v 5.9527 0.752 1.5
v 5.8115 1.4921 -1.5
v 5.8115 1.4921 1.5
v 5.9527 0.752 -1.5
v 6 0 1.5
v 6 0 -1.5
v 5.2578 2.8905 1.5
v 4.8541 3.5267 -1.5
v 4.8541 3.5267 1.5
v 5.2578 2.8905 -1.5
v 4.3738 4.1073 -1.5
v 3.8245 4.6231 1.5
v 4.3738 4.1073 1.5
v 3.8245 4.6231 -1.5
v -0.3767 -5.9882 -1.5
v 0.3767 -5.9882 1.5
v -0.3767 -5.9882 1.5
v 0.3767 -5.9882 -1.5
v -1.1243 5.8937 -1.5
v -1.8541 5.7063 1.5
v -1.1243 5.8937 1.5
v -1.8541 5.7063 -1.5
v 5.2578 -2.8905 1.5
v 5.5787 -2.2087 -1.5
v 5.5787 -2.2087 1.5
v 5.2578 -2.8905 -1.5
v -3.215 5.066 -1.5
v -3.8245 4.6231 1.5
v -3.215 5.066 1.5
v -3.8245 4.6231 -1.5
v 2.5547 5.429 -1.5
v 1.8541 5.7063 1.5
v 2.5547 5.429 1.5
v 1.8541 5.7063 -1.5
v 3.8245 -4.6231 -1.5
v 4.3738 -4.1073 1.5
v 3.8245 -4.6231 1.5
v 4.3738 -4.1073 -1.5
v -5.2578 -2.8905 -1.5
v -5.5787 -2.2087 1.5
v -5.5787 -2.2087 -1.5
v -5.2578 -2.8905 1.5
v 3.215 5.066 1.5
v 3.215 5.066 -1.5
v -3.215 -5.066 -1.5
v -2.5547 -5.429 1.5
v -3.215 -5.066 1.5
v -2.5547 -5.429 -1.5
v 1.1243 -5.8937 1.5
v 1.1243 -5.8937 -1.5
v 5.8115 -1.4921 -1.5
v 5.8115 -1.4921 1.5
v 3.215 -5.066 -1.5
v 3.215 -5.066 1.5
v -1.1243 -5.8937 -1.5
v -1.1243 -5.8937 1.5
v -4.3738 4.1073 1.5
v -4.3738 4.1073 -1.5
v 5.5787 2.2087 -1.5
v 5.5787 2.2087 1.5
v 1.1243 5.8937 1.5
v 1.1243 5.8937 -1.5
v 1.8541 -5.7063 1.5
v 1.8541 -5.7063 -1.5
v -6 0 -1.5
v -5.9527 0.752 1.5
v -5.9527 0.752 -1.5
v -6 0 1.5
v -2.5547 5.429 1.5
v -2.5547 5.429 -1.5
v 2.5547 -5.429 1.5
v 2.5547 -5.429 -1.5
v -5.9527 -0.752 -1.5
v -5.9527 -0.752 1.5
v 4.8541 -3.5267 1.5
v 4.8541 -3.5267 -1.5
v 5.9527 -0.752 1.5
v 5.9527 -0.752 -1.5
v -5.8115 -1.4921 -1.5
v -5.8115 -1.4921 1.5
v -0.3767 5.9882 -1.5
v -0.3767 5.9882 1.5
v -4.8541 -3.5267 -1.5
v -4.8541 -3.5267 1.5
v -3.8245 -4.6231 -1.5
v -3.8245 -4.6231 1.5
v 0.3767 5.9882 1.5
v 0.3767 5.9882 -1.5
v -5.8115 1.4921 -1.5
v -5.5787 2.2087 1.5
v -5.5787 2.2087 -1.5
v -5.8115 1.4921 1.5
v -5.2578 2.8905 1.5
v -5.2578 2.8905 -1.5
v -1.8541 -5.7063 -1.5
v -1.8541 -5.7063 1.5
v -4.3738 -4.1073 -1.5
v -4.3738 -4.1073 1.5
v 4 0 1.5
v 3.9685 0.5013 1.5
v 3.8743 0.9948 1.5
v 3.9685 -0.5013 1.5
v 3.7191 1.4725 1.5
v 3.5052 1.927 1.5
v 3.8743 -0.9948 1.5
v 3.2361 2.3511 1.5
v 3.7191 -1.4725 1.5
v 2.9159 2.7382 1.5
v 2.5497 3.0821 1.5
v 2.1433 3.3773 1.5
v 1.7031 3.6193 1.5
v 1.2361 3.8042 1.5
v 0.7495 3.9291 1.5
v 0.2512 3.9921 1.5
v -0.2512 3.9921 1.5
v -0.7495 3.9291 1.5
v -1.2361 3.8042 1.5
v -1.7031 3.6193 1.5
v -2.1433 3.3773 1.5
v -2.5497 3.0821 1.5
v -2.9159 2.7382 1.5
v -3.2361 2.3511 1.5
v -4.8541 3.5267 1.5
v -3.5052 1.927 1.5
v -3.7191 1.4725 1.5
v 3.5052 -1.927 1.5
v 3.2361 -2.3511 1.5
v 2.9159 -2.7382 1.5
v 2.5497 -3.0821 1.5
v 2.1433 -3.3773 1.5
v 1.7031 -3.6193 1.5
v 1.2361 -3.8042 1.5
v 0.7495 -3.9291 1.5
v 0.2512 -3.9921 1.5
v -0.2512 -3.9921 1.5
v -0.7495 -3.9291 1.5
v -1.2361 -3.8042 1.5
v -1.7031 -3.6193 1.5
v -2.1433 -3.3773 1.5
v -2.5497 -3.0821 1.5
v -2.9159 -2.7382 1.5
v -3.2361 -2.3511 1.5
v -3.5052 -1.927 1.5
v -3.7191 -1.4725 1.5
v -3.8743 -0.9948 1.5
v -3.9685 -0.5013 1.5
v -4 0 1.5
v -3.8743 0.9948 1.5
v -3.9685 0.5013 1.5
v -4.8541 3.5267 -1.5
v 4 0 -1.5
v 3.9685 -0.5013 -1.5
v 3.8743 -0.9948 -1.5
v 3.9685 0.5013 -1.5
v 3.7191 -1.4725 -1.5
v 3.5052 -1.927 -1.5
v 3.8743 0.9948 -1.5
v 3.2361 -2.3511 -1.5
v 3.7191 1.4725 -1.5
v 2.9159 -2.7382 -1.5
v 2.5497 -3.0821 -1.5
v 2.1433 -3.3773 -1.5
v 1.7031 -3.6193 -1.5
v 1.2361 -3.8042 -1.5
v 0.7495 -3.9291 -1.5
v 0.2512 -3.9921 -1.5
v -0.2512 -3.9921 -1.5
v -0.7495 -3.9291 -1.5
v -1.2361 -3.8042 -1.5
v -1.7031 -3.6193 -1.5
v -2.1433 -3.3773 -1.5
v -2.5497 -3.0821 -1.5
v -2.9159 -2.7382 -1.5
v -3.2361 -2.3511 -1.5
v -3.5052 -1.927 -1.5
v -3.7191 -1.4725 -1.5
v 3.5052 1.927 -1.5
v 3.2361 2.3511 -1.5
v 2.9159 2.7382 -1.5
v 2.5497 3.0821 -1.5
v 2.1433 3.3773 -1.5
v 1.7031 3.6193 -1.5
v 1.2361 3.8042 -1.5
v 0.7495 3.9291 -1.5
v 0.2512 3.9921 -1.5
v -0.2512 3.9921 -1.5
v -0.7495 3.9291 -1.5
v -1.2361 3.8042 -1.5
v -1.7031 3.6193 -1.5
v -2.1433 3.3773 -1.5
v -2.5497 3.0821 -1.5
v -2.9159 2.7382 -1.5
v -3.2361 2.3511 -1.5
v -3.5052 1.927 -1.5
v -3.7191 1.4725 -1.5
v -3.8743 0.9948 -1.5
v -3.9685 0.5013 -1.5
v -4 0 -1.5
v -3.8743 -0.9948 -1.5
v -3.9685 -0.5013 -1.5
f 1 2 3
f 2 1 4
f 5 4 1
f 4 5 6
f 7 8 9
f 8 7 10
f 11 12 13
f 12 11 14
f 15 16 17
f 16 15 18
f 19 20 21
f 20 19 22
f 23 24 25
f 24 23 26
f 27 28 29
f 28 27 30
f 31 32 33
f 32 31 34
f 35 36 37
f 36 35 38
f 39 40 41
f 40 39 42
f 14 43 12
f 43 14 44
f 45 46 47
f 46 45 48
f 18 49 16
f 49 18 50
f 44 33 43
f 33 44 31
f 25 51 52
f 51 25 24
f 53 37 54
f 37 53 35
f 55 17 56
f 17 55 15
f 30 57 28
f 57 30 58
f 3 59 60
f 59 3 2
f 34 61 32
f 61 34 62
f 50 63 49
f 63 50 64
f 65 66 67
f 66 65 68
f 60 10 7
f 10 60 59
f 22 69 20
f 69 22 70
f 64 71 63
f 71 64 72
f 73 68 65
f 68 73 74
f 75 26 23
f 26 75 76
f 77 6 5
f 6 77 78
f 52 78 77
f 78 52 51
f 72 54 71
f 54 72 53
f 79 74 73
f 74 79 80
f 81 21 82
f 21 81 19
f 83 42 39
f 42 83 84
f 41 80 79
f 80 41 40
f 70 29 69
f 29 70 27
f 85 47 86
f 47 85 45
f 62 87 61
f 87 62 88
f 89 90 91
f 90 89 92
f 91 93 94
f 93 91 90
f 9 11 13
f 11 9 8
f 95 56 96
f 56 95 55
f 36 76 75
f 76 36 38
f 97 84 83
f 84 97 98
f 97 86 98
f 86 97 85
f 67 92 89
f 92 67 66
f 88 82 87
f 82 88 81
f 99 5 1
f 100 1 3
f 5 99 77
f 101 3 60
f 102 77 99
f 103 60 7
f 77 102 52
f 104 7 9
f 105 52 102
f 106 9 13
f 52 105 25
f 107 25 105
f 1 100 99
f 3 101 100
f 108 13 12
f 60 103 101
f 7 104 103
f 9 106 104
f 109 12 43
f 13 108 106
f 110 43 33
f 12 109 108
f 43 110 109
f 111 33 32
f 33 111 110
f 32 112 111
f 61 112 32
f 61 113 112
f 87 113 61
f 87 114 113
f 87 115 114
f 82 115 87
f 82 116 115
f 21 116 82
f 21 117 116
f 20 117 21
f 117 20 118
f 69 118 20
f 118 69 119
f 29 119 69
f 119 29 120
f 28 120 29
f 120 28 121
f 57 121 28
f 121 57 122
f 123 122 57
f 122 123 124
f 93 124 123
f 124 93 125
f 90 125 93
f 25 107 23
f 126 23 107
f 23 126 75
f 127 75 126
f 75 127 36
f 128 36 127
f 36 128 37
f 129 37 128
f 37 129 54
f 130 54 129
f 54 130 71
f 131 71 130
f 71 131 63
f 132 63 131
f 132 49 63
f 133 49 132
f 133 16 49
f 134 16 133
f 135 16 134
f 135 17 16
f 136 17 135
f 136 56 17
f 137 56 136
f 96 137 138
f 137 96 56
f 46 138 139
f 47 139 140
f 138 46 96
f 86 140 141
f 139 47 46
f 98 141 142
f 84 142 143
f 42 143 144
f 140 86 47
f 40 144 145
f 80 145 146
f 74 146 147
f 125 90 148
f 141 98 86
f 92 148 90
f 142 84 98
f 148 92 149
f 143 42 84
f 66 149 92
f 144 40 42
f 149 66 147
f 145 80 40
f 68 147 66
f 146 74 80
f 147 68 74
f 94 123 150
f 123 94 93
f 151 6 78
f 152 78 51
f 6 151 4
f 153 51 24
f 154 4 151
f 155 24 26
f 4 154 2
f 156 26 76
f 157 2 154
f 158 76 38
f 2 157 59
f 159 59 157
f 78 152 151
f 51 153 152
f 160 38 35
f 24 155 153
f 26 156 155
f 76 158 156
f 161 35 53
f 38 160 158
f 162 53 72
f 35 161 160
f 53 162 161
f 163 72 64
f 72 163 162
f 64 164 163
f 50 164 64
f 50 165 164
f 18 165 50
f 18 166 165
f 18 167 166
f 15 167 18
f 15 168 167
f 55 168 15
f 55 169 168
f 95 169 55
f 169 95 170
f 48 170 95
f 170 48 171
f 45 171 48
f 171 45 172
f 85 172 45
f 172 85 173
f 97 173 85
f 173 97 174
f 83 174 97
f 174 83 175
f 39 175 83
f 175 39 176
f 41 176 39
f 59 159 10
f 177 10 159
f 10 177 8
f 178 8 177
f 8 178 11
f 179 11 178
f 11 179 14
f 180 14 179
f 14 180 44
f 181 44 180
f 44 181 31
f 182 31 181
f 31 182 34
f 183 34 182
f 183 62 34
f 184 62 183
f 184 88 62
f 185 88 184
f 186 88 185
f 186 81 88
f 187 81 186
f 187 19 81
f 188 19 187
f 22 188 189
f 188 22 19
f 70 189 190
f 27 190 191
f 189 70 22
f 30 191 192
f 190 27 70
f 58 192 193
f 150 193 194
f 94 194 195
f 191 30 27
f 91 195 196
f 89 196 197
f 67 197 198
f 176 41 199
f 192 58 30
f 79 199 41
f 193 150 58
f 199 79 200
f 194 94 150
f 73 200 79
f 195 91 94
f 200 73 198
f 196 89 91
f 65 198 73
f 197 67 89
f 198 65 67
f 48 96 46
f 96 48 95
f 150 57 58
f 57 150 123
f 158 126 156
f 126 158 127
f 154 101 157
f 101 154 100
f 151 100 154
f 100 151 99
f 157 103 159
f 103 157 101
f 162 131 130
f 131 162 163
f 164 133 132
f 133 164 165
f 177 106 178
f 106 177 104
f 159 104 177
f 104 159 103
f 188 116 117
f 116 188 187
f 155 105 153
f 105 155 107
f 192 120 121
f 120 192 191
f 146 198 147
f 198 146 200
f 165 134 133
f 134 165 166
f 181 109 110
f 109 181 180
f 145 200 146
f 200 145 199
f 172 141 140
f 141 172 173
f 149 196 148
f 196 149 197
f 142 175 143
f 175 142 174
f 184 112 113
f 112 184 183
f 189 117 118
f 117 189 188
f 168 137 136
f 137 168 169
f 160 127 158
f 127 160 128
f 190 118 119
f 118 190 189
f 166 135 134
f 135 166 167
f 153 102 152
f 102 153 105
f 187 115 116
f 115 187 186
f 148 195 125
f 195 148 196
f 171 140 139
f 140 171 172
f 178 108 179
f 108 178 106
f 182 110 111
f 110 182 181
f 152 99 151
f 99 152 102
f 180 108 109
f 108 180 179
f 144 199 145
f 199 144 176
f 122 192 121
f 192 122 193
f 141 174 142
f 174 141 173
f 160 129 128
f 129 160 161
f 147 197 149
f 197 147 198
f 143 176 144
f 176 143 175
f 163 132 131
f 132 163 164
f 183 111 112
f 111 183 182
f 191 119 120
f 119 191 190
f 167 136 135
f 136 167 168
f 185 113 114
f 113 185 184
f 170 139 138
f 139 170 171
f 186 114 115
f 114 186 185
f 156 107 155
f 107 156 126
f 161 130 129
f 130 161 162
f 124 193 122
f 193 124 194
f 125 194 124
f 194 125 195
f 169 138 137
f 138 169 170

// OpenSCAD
$fn = 50;


difference() {
	union() {
		translate(v = [0, 0, -1.5000000000]) {
			cylinder(h = 3, r = 6.0000000000);
		}
	}
	union() {
		translate(v = [0, 0, -100.0000000000]) {
			cylinder(h = 200, r = 4.0000000000);
		}
	}
}
